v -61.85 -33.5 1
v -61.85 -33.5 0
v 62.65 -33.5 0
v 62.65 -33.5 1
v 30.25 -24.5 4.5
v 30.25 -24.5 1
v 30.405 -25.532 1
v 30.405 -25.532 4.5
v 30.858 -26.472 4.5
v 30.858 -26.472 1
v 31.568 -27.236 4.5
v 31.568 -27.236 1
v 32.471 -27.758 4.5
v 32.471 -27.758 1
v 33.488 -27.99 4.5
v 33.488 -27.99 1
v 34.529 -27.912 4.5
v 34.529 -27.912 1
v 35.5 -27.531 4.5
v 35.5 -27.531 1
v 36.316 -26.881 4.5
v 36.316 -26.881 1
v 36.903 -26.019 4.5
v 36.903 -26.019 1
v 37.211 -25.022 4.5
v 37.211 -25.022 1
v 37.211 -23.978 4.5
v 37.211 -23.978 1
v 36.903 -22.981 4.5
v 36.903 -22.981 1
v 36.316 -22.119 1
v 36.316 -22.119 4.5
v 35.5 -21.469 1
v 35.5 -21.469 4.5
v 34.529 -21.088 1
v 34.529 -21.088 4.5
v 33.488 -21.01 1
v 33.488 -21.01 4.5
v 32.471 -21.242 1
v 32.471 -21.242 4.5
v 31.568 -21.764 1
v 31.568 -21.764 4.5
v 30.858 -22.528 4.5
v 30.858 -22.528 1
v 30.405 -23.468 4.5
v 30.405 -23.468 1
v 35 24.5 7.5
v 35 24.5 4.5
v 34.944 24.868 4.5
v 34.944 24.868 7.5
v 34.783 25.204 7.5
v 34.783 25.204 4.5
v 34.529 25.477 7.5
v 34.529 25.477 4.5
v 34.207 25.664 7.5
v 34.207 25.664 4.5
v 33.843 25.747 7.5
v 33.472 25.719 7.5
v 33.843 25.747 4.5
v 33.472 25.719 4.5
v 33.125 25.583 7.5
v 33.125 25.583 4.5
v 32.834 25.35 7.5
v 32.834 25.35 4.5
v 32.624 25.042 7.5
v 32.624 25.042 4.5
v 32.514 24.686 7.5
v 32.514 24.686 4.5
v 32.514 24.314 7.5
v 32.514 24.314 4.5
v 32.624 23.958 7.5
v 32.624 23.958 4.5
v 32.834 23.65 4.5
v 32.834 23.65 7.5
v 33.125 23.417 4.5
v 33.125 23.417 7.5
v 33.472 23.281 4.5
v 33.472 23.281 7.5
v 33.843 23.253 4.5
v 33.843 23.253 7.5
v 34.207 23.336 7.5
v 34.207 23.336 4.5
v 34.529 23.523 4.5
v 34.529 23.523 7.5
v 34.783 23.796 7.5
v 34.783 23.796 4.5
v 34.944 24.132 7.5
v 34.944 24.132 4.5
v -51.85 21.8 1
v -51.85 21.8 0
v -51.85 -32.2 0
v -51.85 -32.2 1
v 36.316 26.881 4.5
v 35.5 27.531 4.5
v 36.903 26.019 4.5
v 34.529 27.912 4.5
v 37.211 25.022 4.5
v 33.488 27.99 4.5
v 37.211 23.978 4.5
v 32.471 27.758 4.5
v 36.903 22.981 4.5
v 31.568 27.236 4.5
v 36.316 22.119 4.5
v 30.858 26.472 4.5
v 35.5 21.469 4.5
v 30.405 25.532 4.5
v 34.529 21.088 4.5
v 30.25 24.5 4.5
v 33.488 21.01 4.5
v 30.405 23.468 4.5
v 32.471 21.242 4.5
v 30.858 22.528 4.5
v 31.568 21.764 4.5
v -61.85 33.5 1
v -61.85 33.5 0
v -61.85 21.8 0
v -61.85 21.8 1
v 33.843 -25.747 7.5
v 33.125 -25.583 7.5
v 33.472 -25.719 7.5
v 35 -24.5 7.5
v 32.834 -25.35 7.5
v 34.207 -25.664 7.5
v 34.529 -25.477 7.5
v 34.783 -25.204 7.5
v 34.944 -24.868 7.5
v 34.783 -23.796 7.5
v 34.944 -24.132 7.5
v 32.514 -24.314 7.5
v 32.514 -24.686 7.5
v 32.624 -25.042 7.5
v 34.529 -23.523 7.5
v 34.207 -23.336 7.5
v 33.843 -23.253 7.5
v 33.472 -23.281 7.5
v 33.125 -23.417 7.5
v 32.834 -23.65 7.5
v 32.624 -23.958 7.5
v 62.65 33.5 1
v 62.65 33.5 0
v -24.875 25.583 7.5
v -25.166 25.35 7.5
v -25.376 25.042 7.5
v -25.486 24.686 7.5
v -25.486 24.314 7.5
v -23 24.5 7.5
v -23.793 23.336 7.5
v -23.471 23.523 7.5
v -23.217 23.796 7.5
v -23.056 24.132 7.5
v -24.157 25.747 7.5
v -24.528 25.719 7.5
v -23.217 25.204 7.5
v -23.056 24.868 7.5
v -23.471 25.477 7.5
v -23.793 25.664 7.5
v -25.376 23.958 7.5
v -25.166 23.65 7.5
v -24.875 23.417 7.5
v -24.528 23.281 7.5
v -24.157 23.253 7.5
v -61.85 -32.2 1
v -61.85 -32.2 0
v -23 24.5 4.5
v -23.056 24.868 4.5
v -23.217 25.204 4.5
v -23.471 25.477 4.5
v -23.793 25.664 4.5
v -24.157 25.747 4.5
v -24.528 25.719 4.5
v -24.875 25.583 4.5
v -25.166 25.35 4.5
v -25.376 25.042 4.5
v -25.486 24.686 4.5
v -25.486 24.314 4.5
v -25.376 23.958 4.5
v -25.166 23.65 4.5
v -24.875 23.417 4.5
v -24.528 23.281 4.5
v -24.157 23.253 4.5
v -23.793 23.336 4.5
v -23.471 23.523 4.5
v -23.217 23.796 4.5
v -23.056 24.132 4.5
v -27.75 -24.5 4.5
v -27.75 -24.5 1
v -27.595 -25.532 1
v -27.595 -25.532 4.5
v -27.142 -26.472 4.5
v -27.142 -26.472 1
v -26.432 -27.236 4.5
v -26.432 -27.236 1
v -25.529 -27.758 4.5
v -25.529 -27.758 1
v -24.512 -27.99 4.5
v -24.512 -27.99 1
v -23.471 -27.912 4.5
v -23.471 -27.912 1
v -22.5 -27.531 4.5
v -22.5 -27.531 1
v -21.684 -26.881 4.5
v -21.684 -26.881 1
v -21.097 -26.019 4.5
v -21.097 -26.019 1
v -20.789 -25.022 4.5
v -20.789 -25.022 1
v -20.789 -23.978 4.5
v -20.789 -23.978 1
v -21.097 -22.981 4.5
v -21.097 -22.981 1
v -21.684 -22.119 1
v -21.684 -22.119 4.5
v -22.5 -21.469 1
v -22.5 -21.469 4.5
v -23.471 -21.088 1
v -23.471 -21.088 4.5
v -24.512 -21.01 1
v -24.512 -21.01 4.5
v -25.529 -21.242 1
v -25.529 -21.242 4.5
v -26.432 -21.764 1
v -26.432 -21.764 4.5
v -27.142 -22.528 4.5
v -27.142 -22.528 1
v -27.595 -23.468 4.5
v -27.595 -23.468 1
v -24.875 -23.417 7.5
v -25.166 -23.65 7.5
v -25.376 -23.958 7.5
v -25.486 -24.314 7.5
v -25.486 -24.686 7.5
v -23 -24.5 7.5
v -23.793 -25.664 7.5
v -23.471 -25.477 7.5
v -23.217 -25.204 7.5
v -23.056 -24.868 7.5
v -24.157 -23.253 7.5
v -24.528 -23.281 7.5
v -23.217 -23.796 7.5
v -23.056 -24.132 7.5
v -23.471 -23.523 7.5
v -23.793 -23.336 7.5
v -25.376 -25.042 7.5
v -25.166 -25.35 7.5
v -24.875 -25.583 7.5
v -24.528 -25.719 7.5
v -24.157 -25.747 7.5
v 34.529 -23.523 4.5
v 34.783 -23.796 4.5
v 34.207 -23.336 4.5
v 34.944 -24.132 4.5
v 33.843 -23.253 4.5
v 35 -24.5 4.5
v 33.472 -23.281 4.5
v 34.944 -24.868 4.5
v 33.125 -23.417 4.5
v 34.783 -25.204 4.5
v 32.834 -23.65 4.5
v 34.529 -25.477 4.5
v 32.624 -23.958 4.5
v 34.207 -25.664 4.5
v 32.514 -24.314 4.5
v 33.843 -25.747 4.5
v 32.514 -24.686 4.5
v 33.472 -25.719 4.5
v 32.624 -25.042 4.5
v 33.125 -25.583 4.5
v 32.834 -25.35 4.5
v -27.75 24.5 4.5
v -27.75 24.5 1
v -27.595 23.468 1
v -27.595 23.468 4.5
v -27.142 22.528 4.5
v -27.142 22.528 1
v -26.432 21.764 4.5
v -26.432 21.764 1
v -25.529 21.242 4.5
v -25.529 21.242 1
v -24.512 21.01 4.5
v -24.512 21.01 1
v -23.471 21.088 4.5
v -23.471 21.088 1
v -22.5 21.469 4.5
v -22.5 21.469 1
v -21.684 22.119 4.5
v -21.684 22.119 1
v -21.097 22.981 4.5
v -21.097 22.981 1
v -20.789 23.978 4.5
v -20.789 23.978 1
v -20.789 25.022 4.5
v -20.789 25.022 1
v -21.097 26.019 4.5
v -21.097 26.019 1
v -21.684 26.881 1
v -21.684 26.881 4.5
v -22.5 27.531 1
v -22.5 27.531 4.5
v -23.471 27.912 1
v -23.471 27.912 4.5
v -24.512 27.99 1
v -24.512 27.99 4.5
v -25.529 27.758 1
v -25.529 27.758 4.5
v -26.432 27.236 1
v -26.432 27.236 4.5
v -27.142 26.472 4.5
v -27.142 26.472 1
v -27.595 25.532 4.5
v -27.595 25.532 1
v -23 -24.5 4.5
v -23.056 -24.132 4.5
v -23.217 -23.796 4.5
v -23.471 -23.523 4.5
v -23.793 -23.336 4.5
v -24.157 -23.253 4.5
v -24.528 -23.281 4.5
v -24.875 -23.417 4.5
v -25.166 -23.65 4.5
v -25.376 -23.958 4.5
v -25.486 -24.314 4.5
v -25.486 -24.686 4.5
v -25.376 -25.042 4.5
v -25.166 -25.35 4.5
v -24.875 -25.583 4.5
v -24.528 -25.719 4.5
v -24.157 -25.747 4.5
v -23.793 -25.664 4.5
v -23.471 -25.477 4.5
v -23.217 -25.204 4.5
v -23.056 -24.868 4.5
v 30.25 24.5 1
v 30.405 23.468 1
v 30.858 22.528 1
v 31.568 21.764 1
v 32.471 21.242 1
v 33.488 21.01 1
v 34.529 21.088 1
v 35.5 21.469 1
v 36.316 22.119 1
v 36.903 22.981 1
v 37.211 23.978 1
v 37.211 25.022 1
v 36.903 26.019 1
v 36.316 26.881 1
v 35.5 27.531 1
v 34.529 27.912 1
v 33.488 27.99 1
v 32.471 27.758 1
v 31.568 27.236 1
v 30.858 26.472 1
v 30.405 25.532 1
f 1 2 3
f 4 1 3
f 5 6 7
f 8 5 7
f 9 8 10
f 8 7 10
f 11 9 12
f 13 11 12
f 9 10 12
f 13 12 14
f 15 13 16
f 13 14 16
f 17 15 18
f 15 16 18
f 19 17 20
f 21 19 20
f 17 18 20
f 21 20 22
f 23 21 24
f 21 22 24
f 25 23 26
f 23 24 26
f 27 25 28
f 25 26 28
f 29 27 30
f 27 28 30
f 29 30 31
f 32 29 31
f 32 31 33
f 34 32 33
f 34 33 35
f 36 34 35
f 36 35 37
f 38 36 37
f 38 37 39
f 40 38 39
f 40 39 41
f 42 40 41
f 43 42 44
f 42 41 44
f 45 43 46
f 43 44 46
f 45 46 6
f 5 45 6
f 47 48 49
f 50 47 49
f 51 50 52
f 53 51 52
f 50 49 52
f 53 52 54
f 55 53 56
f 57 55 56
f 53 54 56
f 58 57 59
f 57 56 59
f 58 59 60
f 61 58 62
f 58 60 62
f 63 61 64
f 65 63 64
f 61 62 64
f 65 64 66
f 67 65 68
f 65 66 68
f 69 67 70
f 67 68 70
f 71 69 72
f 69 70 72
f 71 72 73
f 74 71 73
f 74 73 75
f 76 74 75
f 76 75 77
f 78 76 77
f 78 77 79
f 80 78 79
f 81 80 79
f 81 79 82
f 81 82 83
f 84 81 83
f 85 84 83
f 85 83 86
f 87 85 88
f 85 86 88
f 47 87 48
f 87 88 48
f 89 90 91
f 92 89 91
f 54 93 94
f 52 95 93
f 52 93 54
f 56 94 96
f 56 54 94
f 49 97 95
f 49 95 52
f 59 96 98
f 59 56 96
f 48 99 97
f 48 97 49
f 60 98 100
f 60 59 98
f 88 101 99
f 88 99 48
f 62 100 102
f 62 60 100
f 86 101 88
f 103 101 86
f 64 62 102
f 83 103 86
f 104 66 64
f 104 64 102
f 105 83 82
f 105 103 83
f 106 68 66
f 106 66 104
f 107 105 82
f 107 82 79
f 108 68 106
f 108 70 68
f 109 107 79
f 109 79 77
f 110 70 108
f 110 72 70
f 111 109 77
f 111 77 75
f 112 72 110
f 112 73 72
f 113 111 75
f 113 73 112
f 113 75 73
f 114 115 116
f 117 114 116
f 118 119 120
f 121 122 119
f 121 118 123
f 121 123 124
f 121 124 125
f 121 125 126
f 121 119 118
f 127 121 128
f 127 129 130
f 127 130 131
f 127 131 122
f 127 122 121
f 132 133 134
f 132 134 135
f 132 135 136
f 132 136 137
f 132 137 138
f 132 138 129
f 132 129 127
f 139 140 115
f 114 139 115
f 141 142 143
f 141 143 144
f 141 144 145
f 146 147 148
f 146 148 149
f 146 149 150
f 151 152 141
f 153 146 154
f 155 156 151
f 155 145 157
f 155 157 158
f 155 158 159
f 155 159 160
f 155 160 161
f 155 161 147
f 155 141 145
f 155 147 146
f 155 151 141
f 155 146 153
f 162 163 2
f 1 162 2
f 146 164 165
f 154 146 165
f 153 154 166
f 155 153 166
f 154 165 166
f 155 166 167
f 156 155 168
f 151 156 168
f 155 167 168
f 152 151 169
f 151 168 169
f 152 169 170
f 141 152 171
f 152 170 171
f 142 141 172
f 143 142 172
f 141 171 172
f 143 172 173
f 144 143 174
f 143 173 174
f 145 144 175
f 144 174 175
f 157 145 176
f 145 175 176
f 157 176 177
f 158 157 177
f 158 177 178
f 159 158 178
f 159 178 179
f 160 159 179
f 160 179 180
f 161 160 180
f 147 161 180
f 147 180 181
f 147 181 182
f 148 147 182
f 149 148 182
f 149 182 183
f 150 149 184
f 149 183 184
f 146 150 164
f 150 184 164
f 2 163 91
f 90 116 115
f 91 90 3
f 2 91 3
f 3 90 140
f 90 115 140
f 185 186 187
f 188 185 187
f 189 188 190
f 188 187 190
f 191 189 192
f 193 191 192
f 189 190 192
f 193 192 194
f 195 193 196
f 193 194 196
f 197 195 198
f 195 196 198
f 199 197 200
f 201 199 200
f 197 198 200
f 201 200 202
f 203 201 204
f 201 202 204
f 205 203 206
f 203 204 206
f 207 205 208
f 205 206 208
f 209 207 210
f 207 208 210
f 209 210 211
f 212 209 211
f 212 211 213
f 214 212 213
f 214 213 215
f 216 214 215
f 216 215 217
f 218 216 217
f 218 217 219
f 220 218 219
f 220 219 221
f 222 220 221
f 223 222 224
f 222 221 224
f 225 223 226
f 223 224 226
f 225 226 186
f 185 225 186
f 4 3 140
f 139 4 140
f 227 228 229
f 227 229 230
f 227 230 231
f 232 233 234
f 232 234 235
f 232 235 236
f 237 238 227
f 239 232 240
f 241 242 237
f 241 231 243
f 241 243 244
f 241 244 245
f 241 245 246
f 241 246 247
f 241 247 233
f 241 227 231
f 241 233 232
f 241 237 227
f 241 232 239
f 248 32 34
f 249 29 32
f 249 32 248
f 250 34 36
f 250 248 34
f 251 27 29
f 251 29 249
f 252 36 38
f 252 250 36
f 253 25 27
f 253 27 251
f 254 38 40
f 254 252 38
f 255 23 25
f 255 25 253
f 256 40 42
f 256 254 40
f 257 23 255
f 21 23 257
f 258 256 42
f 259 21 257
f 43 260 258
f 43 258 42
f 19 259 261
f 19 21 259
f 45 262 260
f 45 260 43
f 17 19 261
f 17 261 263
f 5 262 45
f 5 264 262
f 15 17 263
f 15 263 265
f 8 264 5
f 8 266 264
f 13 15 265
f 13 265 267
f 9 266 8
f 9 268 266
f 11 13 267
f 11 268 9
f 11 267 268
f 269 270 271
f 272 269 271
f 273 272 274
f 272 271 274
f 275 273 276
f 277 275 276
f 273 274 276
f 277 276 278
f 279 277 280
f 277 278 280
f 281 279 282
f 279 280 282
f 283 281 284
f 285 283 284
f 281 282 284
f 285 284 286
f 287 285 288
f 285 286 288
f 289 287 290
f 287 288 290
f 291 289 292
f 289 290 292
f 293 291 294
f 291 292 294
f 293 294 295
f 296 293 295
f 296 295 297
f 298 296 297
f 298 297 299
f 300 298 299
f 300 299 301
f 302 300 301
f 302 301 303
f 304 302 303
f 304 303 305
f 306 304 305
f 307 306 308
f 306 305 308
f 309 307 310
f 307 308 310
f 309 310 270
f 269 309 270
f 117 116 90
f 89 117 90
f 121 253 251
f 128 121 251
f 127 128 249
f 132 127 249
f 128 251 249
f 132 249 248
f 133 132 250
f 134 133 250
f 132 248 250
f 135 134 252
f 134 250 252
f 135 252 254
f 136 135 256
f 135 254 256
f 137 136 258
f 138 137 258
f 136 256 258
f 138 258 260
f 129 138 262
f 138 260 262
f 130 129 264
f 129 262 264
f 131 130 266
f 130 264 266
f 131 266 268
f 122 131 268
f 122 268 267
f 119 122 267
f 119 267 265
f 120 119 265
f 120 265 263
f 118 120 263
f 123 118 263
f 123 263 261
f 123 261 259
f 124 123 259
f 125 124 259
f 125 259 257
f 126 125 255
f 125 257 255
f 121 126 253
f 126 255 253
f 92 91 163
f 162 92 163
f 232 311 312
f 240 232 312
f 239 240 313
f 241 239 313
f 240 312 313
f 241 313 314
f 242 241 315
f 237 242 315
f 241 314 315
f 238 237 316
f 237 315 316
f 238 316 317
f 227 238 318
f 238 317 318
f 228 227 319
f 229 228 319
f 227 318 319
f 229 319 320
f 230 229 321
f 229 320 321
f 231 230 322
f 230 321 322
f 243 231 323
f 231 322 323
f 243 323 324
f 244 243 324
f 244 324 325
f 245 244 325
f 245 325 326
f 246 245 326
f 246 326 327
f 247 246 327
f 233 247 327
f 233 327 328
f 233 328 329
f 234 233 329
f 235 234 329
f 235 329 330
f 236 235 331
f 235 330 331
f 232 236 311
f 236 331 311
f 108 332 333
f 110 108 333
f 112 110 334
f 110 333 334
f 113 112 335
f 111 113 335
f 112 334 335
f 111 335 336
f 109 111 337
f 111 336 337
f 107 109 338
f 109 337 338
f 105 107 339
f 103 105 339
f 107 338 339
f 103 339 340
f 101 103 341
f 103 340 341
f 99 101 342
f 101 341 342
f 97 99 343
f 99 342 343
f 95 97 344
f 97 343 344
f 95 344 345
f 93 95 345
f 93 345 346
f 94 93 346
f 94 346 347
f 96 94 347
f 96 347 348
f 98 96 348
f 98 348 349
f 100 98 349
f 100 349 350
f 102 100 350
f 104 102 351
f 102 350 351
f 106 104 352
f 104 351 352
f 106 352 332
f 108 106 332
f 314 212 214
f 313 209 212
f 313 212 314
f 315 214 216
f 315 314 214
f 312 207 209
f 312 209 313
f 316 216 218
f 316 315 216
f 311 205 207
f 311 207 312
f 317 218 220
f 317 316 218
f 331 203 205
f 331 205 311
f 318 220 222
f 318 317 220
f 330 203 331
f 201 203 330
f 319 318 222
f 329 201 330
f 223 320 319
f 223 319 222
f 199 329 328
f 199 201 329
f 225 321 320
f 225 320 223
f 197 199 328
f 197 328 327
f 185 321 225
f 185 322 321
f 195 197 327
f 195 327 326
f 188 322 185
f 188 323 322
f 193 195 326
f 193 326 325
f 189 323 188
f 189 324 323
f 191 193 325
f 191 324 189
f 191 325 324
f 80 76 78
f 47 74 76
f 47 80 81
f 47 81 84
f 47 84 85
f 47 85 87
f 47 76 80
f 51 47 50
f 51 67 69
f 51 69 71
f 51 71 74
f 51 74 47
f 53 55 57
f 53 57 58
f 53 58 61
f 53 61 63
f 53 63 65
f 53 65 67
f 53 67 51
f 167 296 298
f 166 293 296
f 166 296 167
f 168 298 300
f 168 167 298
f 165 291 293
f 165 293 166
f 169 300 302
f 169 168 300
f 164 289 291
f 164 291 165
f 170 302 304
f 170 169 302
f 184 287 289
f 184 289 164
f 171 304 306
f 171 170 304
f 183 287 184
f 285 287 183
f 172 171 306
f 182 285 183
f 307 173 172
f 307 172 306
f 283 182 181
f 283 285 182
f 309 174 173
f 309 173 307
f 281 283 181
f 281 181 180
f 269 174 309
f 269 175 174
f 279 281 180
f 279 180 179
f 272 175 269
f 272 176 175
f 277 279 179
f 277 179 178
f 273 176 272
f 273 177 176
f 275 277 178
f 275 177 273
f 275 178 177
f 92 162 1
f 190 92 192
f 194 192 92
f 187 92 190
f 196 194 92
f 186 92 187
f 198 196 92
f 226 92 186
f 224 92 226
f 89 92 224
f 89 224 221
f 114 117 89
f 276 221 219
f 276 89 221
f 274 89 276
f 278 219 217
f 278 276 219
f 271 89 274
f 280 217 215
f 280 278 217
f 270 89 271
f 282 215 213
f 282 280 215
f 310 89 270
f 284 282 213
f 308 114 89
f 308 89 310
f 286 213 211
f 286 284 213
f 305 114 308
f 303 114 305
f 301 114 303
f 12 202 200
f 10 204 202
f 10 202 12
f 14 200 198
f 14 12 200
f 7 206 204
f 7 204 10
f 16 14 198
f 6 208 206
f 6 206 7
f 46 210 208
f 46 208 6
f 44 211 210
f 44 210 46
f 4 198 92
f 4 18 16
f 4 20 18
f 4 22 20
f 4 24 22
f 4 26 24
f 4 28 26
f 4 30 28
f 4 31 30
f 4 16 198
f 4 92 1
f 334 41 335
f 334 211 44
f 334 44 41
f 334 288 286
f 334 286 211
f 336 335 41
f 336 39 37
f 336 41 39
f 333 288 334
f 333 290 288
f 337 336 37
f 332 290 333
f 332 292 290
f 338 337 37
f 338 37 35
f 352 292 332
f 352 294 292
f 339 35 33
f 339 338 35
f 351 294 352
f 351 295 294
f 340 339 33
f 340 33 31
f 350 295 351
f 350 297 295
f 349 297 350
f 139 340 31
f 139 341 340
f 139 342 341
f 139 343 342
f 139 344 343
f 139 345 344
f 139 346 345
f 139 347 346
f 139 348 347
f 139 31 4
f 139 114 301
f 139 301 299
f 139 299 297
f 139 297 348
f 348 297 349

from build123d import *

# Parameters (mm, degrees)
BOSS_EXTRUDE1_DEPTH = 1
SKETCH2_R           = 3.5
BOSS_EXTRUDE2_DEPTH = 3.5
SKETCH3_R           = 1.25
BOSS_EXTRUDE3_DEPTH = 3


with BuildPart() as part:
    # Sketch1 → Boss-Extrude1 (new body)
    with BuildSketch(Plane.XY):
        Polygon((-61.85, 33.5), (-61.85, 21.8), (-51.85, 21.8), (-51.85, -32.2), (-61.85, -32.2), (-61.85, -33.5), (62.65, -33.5), (62.65, 33.5), align=None)
    extrude(amount=BOSS_EXTRUDE1_DEPTH)

    # Sketch2 → Boss-Extrude2 (add)
    with BuildSketch(Plane.XY.offset(1)):
        with Locations(Location((-24.25, 24.5, 0), (0, 0, 180))):
            Circle(SKETCH2_R)
        with Locations(Location((33.75, 24.5, 0), (0, 0, 180))):
            Circle(SKETCH2_R)
        with Locations(Location((33.75, -24.5, 0), (0, 0, 180))):
            Circle(SKETCH2_R)
        with Locations(Location((-24.25, -24.5, 0), (0, 0, 180))):
            Circle(SKETCH2_R)
    extrude(amount=BOSS_EXTRUDE2_DEPTH)

    # Sketch3 → Boss-Extrude3 (add)
    with BuildSketch(Plane.XY.offset(4.5)):
        with Locations((-24.25, 24.5)):
            Circle(SKETCH3_R)
        with Locations((33.75, 24.5)):
            Circle(SKETCH3_R)
        with Locations((33.75, -24.5)):
            Circle(SKETCH3_R)
        with Locations((-24.25, -24.5)):
            Circle(SKETCH3_R)
    extrude(amount=BOSS_EXTRUDE3_DEPTH)


solid = part.part
